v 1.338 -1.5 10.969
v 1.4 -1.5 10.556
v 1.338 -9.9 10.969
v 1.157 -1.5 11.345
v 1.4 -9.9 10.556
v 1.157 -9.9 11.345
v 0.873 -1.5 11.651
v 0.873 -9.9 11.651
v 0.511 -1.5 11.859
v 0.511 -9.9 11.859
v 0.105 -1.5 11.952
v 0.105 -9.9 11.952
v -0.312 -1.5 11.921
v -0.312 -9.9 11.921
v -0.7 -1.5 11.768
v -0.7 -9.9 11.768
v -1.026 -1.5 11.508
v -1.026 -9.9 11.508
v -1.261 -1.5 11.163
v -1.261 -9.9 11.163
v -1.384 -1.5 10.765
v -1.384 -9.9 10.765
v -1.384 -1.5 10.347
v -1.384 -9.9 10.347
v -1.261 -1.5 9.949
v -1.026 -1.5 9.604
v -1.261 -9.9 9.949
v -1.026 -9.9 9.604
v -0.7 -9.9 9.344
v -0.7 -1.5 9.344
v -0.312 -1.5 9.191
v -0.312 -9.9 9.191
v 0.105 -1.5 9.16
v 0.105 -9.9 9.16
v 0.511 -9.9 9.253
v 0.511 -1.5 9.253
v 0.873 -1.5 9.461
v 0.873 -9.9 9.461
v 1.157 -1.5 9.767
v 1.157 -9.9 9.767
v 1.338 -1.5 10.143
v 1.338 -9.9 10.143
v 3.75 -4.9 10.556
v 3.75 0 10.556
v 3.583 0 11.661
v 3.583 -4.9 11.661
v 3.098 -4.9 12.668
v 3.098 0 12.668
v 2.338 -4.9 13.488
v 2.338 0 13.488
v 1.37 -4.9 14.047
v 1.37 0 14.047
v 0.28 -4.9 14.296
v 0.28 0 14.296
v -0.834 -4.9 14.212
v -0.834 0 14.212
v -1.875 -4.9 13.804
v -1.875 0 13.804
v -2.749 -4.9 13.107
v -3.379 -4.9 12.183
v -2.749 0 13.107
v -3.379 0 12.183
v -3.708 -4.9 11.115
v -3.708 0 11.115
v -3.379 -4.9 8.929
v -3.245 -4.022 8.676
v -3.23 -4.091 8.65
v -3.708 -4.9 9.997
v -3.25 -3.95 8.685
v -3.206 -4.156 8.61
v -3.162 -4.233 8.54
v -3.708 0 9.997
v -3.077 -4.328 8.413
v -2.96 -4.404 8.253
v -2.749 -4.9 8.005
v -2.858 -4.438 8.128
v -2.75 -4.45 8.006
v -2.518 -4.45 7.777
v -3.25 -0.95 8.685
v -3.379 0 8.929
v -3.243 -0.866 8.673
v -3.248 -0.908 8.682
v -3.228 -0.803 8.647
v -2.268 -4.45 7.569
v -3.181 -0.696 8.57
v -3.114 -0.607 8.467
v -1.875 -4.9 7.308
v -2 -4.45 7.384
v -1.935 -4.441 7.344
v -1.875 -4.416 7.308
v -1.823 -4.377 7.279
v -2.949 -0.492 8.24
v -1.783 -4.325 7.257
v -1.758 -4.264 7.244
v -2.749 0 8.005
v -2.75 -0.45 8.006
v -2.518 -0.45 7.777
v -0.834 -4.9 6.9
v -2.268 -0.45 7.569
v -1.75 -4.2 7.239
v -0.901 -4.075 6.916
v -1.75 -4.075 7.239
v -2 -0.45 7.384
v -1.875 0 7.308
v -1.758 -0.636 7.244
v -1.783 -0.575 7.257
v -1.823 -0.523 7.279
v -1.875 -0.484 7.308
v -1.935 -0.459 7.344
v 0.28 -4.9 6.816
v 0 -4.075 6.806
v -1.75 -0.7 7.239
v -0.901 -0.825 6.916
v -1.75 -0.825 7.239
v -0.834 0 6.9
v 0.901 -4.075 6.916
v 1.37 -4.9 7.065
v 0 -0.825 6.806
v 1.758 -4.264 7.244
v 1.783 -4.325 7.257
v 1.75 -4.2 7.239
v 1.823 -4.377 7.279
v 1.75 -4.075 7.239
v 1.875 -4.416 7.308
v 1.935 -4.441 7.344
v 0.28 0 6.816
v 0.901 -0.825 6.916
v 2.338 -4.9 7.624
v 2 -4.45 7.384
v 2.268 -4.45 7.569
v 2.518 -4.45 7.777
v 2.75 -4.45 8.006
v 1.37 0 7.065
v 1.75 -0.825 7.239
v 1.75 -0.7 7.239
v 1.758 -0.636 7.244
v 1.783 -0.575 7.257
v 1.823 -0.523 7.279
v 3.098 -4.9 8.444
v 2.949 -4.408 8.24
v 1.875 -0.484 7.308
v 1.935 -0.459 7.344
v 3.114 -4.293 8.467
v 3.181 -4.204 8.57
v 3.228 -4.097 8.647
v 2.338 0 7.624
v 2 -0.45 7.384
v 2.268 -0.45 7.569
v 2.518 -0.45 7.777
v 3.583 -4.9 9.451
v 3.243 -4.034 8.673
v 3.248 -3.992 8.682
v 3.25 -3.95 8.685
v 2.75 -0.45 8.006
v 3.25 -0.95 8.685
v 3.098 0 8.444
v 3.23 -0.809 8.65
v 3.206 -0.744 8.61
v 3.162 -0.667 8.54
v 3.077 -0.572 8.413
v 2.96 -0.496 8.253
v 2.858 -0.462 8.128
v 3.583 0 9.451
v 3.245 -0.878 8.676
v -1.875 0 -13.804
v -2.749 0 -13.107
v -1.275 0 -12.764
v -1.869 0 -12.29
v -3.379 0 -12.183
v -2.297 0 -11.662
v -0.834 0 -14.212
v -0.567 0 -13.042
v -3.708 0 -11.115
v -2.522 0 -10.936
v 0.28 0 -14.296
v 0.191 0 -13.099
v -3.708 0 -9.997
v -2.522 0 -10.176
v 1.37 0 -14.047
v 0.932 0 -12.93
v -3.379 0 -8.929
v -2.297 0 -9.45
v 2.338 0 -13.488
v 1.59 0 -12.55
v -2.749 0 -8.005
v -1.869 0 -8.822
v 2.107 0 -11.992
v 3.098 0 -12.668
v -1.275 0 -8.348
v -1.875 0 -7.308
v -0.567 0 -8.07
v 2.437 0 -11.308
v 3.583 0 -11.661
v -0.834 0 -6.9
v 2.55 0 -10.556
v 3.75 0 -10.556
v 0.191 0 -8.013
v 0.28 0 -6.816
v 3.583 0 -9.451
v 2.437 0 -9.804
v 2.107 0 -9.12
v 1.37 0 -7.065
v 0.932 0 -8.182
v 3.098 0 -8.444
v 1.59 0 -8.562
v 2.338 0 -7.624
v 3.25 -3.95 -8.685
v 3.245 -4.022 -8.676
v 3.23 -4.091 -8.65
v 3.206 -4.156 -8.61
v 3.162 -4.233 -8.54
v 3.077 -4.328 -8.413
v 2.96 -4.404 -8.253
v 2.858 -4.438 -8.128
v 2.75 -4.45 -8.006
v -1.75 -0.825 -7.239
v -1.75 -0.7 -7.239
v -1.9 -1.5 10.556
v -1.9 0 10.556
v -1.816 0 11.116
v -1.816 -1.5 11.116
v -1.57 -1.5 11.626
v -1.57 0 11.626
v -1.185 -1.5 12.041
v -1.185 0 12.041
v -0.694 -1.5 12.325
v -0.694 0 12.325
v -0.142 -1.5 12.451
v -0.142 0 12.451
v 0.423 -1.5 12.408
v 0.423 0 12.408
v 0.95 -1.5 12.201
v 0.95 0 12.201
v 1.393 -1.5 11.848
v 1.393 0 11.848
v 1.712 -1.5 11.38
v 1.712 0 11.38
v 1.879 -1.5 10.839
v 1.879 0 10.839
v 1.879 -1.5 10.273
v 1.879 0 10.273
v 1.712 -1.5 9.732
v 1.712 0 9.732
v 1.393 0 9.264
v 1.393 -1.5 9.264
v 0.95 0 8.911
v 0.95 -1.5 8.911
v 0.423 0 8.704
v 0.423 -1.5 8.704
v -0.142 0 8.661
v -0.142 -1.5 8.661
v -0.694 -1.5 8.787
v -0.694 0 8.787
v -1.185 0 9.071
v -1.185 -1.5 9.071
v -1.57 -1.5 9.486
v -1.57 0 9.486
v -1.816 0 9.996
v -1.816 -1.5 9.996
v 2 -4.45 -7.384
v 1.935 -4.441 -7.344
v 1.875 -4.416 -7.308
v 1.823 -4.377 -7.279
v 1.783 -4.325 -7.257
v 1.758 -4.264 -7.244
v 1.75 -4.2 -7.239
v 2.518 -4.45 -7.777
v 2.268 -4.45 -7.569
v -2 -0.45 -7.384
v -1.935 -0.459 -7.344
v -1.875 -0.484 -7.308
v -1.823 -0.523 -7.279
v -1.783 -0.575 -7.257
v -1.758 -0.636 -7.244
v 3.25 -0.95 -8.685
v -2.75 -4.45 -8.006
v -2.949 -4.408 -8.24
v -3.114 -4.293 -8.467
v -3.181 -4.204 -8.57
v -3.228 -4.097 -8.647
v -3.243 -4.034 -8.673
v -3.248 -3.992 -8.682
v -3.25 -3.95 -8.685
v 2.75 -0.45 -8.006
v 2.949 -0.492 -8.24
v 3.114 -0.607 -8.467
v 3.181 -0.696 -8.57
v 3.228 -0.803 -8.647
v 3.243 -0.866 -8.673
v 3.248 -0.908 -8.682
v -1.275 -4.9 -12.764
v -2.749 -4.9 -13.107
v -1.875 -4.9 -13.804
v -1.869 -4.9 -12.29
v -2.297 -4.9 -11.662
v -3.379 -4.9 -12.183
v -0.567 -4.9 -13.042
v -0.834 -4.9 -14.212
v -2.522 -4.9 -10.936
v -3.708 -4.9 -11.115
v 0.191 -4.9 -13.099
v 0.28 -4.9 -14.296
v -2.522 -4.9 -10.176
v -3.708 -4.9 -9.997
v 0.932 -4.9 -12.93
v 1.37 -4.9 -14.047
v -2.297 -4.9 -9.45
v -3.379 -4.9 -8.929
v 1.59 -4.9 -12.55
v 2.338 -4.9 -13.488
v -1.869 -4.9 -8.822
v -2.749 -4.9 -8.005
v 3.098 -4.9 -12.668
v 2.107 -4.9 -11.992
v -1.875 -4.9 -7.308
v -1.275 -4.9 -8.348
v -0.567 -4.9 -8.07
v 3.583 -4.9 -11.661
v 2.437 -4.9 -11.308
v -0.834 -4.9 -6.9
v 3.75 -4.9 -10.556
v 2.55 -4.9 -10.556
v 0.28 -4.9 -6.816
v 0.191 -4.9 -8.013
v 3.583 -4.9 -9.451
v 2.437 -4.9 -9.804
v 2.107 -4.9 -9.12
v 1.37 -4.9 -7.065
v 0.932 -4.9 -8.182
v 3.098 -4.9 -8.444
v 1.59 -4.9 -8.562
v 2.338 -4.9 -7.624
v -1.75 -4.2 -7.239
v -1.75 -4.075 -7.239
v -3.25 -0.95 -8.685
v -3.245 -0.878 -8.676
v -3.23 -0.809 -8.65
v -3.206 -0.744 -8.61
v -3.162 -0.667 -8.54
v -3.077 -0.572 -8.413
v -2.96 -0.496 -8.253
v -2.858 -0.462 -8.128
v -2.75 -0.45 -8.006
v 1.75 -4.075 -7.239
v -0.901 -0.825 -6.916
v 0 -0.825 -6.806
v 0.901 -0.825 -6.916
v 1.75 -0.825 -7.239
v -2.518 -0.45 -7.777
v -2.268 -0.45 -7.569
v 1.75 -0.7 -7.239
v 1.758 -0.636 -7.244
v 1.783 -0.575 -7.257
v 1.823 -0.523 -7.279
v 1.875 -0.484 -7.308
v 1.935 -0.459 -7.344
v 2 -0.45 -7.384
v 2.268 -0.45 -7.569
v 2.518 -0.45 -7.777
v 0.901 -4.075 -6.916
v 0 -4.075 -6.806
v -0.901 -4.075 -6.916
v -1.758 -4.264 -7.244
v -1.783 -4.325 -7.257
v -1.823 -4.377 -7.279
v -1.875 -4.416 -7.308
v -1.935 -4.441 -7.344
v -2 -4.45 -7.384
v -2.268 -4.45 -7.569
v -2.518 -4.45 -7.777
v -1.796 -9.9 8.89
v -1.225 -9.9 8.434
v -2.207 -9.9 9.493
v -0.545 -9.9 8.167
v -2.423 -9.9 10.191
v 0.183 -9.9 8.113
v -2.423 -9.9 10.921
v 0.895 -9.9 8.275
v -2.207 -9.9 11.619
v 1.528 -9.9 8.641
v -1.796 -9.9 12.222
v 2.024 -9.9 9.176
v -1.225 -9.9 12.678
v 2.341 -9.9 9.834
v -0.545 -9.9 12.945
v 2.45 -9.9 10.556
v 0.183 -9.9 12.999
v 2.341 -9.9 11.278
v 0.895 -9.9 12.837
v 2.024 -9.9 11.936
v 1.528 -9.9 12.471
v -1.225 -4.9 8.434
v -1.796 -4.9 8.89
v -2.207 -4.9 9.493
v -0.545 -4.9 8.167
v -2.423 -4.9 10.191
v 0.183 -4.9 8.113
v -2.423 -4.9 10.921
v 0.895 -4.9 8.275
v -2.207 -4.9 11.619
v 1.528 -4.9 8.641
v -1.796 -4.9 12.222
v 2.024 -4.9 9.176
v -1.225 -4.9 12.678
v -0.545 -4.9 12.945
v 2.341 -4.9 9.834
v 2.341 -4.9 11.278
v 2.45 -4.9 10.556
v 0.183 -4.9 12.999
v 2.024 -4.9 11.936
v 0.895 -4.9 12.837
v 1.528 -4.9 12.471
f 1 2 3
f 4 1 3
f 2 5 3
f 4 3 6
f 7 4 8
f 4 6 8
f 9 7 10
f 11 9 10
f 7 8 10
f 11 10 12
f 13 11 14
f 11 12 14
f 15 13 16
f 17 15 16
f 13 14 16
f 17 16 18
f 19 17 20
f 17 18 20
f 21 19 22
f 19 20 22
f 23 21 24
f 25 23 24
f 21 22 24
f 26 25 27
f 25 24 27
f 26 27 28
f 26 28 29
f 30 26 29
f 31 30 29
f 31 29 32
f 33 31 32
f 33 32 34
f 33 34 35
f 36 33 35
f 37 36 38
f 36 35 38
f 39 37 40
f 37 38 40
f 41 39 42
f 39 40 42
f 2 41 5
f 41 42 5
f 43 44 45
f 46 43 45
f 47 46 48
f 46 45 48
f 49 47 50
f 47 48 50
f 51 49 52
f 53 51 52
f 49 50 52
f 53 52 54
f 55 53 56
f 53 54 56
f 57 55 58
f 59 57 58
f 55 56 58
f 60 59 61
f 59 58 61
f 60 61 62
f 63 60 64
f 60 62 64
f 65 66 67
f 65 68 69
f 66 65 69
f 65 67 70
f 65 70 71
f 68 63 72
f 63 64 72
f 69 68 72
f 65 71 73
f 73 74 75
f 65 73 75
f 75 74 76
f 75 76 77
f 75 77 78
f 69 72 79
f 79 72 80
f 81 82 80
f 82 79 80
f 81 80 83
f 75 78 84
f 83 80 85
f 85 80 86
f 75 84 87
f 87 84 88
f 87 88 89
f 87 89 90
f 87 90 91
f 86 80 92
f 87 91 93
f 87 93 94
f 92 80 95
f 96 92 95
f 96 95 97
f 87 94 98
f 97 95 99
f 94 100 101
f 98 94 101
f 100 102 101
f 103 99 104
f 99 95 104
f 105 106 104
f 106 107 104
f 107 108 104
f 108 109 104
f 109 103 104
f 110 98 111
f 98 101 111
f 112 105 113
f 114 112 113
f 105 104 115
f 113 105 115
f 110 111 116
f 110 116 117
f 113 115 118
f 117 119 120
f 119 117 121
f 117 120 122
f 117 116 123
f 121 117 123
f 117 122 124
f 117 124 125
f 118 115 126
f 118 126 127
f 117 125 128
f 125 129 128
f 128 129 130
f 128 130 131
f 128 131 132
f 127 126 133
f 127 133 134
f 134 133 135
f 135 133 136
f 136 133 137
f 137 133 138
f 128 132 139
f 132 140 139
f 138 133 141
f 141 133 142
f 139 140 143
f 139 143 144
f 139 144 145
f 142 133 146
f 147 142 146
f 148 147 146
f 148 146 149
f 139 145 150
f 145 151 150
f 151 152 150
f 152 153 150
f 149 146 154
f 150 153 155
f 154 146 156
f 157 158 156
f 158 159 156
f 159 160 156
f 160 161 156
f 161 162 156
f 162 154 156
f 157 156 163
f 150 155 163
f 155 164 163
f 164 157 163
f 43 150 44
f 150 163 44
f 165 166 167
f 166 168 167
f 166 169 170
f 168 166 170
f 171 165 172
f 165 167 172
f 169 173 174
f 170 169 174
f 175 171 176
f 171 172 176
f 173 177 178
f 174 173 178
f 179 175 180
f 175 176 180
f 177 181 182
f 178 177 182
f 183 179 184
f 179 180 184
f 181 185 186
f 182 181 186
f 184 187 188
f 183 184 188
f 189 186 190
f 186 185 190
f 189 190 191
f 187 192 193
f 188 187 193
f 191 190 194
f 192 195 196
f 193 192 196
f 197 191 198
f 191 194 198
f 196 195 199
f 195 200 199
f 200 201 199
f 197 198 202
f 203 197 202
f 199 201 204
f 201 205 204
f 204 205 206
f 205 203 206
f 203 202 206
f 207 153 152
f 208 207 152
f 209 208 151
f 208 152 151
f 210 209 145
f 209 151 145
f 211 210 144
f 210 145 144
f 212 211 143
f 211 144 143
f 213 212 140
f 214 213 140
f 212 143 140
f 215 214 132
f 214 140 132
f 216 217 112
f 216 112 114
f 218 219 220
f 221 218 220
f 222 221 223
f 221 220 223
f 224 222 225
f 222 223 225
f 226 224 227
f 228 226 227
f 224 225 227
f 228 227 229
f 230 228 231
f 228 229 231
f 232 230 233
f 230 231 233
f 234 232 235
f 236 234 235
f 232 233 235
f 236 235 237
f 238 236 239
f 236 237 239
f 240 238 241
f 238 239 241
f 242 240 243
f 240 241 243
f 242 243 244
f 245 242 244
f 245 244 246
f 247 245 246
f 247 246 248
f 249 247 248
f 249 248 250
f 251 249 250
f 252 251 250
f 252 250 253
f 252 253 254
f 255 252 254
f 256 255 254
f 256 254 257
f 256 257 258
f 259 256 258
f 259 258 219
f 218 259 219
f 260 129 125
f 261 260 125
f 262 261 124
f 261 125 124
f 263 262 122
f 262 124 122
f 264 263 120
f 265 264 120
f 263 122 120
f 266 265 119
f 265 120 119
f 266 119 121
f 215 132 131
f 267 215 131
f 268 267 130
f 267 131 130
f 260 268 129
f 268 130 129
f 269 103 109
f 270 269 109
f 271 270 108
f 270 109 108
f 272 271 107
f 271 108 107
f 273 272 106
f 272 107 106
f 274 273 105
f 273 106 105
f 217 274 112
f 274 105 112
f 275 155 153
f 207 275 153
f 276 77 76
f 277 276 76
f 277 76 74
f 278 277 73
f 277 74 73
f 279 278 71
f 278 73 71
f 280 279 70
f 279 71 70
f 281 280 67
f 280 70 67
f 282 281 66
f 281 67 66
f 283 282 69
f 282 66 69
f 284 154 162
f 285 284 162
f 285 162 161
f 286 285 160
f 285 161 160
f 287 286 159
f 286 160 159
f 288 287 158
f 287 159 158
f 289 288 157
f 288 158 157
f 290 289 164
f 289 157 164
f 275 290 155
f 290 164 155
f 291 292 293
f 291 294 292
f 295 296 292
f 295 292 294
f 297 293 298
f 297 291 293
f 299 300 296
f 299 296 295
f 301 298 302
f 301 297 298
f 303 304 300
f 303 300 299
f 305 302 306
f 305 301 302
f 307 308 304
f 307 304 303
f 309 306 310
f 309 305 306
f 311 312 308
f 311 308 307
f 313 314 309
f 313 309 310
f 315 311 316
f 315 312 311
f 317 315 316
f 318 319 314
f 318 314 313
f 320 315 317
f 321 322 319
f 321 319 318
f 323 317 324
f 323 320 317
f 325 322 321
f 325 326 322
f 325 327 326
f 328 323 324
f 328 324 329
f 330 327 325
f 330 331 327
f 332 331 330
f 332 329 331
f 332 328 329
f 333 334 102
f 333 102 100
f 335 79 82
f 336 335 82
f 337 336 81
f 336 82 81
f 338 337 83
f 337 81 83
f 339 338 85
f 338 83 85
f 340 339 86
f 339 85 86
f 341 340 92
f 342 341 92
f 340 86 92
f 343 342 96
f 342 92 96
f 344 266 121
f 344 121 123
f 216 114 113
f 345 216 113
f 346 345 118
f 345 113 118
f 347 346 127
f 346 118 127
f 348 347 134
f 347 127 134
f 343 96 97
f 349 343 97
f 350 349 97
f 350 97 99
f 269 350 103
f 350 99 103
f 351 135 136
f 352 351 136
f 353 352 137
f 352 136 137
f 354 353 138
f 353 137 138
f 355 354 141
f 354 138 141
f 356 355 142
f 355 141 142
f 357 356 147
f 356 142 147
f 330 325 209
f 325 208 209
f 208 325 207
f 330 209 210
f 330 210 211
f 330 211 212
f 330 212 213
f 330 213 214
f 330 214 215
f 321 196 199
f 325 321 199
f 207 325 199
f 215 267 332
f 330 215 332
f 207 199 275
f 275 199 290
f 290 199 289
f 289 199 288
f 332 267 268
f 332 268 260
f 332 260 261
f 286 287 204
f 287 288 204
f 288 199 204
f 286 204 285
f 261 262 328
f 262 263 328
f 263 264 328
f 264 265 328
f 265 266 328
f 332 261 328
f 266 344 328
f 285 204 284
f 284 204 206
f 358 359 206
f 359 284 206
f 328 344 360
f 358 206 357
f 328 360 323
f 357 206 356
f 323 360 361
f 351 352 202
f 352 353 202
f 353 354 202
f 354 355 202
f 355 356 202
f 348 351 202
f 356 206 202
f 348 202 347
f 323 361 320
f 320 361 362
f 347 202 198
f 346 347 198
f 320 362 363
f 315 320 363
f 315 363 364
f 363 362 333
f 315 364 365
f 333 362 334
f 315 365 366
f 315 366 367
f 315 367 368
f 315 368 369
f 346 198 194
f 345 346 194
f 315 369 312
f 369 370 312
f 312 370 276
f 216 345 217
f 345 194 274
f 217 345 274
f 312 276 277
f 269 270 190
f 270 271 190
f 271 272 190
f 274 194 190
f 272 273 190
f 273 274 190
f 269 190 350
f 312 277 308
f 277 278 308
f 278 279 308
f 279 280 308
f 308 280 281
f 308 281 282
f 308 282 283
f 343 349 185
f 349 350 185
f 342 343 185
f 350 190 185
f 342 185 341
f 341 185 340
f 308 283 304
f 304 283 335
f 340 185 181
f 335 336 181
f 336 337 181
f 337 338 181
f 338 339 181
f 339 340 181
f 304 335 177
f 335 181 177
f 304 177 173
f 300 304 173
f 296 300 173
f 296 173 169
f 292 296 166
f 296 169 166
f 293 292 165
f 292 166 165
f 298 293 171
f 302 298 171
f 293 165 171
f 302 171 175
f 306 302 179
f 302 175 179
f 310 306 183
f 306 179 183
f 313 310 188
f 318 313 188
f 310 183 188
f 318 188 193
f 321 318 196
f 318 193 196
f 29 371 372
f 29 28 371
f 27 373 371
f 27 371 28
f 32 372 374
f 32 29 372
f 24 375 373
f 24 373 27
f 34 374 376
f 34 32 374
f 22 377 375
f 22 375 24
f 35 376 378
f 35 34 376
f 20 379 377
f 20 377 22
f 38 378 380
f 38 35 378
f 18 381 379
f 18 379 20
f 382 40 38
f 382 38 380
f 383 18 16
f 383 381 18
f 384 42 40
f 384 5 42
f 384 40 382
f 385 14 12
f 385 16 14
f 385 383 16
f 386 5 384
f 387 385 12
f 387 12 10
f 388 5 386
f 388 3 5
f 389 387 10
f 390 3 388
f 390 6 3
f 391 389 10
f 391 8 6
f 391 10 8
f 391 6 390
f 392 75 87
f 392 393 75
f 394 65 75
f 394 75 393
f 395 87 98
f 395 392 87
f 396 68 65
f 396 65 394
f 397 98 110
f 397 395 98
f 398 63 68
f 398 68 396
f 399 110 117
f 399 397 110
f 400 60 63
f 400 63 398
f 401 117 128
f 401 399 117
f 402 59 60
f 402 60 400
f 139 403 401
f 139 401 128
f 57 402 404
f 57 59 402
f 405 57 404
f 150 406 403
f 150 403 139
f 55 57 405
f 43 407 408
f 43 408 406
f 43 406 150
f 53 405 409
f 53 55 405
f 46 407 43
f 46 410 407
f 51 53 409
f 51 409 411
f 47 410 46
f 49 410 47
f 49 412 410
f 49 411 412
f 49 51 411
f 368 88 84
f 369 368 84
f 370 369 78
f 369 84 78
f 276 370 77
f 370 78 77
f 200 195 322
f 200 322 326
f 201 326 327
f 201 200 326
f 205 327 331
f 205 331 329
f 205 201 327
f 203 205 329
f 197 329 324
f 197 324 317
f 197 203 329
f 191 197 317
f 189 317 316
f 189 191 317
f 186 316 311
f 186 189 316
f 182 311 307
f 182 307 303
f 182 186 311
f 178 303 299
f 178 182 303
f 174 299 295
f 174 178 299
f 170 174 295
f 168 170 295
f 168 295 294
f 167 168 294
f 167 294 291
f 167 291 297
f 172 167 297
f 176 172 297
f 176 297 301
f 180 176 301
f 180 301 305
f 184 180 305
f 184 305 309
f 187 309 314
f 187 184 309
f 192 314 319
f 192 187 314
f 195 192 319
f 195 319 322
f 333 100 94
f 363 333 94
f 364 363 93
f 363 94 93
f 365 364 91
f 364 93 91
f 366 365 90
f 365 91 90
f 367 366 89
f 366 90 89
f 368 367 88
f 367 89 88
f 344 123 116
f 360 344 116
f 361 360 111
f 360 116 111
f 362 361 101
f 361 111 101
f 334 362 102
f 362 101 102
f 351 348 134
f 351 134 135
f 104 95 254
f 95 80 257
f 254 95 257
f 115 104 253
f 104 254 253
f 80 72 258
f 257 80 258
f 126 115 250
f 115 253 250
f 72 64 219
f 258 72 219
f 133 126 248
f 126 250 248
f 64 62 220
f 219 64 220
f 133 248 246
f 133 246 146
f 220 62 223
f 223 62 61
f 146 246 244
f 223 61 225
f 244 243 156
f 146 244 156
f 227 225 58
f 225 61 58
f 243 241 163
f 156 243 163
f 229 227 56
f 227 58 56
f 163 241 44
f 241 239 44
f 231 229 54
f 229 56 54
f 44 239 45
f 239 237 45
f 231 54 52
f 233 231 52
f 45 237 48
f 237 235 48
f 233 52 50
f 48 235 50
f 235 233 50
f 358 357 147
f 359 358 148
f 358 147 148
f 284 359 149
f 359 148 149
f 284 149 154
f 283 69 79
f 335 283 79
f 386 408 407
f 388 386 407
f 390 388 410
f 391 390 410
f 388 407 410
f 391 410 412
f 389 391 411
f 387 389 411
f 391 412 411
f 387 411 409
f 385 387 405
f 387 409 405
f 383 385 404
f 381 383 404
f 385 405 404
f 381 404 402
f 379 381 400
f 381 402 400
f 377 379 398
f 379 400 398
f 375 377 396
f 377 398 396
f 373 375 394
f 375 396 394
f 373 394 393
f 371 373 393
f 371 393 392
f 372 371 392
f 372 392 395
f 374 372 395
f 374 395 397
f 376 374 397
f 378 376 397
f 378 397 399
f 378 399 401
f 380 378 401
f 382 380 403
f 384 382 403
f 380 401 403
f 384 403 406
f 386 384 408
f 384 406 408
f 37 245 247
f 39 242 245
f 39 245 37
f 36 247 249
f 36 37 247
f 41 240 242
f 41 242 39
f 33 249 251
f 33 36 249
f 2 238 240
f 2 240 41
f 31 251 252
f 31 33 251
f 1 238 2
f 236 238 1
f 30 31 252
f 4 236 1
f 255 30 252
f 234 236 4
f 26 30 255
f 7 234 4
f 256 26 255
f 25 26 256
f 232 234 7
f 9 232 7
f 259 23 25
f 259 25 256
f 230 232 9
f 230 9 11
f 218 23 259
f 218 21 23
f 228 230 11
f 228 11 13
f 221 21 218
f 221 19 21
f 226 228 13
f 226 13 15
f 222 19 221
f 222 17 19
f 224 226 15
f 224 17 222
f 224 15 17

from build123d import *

# Parameters (mm, degrees)
F0_R           = 3.75
F0_R_2         = 2.55
F0_R_3         = 2.45
F1_DEPTH       = 4.9
F6_R           = 2.45
F7_DEPTH       = 5
F8_D           = 2.8
F8_CBORE_D     = 3.8
F8_CBORE_DEPTH = 1.5


with BuildPart() as f1:
    # F0 (on Front) → F1 (new body)
    with BuildSketch(Plane.XZ):
        with Locations((0, -10.556)):
            Circle(F0_R)
        with Locations((0, -10.556)):
            Circle(F0_R_2, mode=Mode.SUBTRACT)
        with Locations((0, 10.556)):
            Circle(F0_R)
        with Locations((0, 10.556)):
            Circle(F0_R_3, mode=Mode.SUBTRACT)
        with Locations((0, 10.556)):
            Circle(F0_R_3)
    extrude(amount=F1_DEPTH)

    # F2 (on Top) → F3 (join, up to the next surface of F1)
    with BuildSketch(Plane.XY):
        with BuildLine():
            Line((-2, -0.45), (-2.75, -0.45))
            ThreePointArc((-2.75, -0.45), (-3.1035533906, -0.5964466094), (-3.25, -0.95))
            Line((-3.25, -0.95), (-3.25, -3.95))
            ThreePointArc((-3.25, -3.95), (-3.1035533906, -4.3035533906), (-2.75, -4.45))
            Line((-2.75, -4.45), (-2, -4.45))
            ThreePointArc((-2, -4.45), (-1.8232233047, -4.3767766953), (-1.75, -4.2))
            Line((-1.75, -4.2), (-1.75, -4.075))
            Line((-1.75, -4.075), (1.75, -4.075))
            Line((1.75, -4.075), (1.75, -4.2))
            ThreePointArc((1.75, -4.2), (1.8232233047, -4.3767766953), (2, -4.45))
            Line((2, -4.45), (2.75, -4.45))
            ThreePointArc((2.75, -4.45), (3.1035533906, -4.3035533906), (3.25, -3.95))
            Line((3.25, -3.95), (3.25, -0.95))
            ThreePointArc((3.25, -0.95), (3.1035533906, -0.5964466094), (2.75, -0.45))
            Line((2.75, -0.45), (2, -0.45))
            ThreePointArc((2, -0.45), (1.8232233047, -0.5232233047), (1.75, -0.7))
            Line((1.75, -0.7), (1.75, -0.825))
            Line((1.75, -0.825), (-1.75, -0.825))
            Line((-1.75, -0.825), (-1.75, -0.7))
            ThreePointArc((-1.75, -0.7), (-1.8232233047, -0.5232233047), (-2, -0.45))
        make_face()
    extrude(until=Until.NEXT)

    # F3_face (on face) → F4 (join, up to the next surface of F1)
    with BuildSketch(Plane(origin=(0, -2.45, 0), x_dir=(1, 0, 0), z_dir=(0, 0, -1))):
        with BuildLine():
            Line((2, -2), (2.75, -2))
            ThreePointArc((2.75, -2), (3.1035533906, -1.8535533906), (3.25, -1.5))
            Line((3.25, -1.5), (3.25, 1.5))
            ThreePointArc((3.25, 1.5), (3.1035533906, 1.8535533906), (2.75, 2))
            Line((2.75, 2), (2, 2))
            ThreePointArc((2, 2), (1.8232233047, 1.9267766953), (1.75, 1.75))
            Line((1.75, 1.75), (1.75, 1.625))
            Line((1.75, 1.625), (-1.75, 1.625))
            Line((-1.75, 1.625), (-1.75, 1.75))
            ThreePointArc((-1.75, 1.75), (-1.8232233047, 1.9267766953), (-2, 2))
            Line((-2, 2), (-2.75, 2))
            ThreePointArc((-2.75, 2), (-3.1035533906, 1.8535533906), (-3.25, 1.5))
            Line((-3.25, 1.5), (-3.25, -1.5))
            ThreePointArc((-3.25, -1.5), (-3.1035533906, -1.8535533906), (-2.75, -2))
            Line((-2.75, -2), (-2, -2))
            ThreePointArc((-2, -2), (-1.8232233047, -1.9267766953), (-1.75, -1.75))
            Line((-1.75, -1.75), (-1.75, -1.625))
            Line((-1.75, -1.625), (1.75, -1.625))
            Line((1.75, -1.625), (1.75, -1.75))
            ThreePointArc((1.75, -1.75), (1.8232233047, -1.9267766953), (2, -2))
        make_face()
    extrude(until=Until.NEXT)

    # F6 (on face) → F7 (join)
    with BuildSketch(Plane.XZ.offset(4.9)):
        with Locations((0, 10.556)):
            Circle(F6_R)
    extrude(amount=F7_DEPTH)

    # F8 (through all)
    with Locations(Plane(origin=(0, 0, 0), x_dir=(-1, 0, 0), z_dir=(0, 1, 0))):
        with Locations((0, 10.556)):
            CounterBoreHole(F8_D / 2, F8_CBORE_D / 2, F8_CBORE_DEPTH)


solid = f1.part
